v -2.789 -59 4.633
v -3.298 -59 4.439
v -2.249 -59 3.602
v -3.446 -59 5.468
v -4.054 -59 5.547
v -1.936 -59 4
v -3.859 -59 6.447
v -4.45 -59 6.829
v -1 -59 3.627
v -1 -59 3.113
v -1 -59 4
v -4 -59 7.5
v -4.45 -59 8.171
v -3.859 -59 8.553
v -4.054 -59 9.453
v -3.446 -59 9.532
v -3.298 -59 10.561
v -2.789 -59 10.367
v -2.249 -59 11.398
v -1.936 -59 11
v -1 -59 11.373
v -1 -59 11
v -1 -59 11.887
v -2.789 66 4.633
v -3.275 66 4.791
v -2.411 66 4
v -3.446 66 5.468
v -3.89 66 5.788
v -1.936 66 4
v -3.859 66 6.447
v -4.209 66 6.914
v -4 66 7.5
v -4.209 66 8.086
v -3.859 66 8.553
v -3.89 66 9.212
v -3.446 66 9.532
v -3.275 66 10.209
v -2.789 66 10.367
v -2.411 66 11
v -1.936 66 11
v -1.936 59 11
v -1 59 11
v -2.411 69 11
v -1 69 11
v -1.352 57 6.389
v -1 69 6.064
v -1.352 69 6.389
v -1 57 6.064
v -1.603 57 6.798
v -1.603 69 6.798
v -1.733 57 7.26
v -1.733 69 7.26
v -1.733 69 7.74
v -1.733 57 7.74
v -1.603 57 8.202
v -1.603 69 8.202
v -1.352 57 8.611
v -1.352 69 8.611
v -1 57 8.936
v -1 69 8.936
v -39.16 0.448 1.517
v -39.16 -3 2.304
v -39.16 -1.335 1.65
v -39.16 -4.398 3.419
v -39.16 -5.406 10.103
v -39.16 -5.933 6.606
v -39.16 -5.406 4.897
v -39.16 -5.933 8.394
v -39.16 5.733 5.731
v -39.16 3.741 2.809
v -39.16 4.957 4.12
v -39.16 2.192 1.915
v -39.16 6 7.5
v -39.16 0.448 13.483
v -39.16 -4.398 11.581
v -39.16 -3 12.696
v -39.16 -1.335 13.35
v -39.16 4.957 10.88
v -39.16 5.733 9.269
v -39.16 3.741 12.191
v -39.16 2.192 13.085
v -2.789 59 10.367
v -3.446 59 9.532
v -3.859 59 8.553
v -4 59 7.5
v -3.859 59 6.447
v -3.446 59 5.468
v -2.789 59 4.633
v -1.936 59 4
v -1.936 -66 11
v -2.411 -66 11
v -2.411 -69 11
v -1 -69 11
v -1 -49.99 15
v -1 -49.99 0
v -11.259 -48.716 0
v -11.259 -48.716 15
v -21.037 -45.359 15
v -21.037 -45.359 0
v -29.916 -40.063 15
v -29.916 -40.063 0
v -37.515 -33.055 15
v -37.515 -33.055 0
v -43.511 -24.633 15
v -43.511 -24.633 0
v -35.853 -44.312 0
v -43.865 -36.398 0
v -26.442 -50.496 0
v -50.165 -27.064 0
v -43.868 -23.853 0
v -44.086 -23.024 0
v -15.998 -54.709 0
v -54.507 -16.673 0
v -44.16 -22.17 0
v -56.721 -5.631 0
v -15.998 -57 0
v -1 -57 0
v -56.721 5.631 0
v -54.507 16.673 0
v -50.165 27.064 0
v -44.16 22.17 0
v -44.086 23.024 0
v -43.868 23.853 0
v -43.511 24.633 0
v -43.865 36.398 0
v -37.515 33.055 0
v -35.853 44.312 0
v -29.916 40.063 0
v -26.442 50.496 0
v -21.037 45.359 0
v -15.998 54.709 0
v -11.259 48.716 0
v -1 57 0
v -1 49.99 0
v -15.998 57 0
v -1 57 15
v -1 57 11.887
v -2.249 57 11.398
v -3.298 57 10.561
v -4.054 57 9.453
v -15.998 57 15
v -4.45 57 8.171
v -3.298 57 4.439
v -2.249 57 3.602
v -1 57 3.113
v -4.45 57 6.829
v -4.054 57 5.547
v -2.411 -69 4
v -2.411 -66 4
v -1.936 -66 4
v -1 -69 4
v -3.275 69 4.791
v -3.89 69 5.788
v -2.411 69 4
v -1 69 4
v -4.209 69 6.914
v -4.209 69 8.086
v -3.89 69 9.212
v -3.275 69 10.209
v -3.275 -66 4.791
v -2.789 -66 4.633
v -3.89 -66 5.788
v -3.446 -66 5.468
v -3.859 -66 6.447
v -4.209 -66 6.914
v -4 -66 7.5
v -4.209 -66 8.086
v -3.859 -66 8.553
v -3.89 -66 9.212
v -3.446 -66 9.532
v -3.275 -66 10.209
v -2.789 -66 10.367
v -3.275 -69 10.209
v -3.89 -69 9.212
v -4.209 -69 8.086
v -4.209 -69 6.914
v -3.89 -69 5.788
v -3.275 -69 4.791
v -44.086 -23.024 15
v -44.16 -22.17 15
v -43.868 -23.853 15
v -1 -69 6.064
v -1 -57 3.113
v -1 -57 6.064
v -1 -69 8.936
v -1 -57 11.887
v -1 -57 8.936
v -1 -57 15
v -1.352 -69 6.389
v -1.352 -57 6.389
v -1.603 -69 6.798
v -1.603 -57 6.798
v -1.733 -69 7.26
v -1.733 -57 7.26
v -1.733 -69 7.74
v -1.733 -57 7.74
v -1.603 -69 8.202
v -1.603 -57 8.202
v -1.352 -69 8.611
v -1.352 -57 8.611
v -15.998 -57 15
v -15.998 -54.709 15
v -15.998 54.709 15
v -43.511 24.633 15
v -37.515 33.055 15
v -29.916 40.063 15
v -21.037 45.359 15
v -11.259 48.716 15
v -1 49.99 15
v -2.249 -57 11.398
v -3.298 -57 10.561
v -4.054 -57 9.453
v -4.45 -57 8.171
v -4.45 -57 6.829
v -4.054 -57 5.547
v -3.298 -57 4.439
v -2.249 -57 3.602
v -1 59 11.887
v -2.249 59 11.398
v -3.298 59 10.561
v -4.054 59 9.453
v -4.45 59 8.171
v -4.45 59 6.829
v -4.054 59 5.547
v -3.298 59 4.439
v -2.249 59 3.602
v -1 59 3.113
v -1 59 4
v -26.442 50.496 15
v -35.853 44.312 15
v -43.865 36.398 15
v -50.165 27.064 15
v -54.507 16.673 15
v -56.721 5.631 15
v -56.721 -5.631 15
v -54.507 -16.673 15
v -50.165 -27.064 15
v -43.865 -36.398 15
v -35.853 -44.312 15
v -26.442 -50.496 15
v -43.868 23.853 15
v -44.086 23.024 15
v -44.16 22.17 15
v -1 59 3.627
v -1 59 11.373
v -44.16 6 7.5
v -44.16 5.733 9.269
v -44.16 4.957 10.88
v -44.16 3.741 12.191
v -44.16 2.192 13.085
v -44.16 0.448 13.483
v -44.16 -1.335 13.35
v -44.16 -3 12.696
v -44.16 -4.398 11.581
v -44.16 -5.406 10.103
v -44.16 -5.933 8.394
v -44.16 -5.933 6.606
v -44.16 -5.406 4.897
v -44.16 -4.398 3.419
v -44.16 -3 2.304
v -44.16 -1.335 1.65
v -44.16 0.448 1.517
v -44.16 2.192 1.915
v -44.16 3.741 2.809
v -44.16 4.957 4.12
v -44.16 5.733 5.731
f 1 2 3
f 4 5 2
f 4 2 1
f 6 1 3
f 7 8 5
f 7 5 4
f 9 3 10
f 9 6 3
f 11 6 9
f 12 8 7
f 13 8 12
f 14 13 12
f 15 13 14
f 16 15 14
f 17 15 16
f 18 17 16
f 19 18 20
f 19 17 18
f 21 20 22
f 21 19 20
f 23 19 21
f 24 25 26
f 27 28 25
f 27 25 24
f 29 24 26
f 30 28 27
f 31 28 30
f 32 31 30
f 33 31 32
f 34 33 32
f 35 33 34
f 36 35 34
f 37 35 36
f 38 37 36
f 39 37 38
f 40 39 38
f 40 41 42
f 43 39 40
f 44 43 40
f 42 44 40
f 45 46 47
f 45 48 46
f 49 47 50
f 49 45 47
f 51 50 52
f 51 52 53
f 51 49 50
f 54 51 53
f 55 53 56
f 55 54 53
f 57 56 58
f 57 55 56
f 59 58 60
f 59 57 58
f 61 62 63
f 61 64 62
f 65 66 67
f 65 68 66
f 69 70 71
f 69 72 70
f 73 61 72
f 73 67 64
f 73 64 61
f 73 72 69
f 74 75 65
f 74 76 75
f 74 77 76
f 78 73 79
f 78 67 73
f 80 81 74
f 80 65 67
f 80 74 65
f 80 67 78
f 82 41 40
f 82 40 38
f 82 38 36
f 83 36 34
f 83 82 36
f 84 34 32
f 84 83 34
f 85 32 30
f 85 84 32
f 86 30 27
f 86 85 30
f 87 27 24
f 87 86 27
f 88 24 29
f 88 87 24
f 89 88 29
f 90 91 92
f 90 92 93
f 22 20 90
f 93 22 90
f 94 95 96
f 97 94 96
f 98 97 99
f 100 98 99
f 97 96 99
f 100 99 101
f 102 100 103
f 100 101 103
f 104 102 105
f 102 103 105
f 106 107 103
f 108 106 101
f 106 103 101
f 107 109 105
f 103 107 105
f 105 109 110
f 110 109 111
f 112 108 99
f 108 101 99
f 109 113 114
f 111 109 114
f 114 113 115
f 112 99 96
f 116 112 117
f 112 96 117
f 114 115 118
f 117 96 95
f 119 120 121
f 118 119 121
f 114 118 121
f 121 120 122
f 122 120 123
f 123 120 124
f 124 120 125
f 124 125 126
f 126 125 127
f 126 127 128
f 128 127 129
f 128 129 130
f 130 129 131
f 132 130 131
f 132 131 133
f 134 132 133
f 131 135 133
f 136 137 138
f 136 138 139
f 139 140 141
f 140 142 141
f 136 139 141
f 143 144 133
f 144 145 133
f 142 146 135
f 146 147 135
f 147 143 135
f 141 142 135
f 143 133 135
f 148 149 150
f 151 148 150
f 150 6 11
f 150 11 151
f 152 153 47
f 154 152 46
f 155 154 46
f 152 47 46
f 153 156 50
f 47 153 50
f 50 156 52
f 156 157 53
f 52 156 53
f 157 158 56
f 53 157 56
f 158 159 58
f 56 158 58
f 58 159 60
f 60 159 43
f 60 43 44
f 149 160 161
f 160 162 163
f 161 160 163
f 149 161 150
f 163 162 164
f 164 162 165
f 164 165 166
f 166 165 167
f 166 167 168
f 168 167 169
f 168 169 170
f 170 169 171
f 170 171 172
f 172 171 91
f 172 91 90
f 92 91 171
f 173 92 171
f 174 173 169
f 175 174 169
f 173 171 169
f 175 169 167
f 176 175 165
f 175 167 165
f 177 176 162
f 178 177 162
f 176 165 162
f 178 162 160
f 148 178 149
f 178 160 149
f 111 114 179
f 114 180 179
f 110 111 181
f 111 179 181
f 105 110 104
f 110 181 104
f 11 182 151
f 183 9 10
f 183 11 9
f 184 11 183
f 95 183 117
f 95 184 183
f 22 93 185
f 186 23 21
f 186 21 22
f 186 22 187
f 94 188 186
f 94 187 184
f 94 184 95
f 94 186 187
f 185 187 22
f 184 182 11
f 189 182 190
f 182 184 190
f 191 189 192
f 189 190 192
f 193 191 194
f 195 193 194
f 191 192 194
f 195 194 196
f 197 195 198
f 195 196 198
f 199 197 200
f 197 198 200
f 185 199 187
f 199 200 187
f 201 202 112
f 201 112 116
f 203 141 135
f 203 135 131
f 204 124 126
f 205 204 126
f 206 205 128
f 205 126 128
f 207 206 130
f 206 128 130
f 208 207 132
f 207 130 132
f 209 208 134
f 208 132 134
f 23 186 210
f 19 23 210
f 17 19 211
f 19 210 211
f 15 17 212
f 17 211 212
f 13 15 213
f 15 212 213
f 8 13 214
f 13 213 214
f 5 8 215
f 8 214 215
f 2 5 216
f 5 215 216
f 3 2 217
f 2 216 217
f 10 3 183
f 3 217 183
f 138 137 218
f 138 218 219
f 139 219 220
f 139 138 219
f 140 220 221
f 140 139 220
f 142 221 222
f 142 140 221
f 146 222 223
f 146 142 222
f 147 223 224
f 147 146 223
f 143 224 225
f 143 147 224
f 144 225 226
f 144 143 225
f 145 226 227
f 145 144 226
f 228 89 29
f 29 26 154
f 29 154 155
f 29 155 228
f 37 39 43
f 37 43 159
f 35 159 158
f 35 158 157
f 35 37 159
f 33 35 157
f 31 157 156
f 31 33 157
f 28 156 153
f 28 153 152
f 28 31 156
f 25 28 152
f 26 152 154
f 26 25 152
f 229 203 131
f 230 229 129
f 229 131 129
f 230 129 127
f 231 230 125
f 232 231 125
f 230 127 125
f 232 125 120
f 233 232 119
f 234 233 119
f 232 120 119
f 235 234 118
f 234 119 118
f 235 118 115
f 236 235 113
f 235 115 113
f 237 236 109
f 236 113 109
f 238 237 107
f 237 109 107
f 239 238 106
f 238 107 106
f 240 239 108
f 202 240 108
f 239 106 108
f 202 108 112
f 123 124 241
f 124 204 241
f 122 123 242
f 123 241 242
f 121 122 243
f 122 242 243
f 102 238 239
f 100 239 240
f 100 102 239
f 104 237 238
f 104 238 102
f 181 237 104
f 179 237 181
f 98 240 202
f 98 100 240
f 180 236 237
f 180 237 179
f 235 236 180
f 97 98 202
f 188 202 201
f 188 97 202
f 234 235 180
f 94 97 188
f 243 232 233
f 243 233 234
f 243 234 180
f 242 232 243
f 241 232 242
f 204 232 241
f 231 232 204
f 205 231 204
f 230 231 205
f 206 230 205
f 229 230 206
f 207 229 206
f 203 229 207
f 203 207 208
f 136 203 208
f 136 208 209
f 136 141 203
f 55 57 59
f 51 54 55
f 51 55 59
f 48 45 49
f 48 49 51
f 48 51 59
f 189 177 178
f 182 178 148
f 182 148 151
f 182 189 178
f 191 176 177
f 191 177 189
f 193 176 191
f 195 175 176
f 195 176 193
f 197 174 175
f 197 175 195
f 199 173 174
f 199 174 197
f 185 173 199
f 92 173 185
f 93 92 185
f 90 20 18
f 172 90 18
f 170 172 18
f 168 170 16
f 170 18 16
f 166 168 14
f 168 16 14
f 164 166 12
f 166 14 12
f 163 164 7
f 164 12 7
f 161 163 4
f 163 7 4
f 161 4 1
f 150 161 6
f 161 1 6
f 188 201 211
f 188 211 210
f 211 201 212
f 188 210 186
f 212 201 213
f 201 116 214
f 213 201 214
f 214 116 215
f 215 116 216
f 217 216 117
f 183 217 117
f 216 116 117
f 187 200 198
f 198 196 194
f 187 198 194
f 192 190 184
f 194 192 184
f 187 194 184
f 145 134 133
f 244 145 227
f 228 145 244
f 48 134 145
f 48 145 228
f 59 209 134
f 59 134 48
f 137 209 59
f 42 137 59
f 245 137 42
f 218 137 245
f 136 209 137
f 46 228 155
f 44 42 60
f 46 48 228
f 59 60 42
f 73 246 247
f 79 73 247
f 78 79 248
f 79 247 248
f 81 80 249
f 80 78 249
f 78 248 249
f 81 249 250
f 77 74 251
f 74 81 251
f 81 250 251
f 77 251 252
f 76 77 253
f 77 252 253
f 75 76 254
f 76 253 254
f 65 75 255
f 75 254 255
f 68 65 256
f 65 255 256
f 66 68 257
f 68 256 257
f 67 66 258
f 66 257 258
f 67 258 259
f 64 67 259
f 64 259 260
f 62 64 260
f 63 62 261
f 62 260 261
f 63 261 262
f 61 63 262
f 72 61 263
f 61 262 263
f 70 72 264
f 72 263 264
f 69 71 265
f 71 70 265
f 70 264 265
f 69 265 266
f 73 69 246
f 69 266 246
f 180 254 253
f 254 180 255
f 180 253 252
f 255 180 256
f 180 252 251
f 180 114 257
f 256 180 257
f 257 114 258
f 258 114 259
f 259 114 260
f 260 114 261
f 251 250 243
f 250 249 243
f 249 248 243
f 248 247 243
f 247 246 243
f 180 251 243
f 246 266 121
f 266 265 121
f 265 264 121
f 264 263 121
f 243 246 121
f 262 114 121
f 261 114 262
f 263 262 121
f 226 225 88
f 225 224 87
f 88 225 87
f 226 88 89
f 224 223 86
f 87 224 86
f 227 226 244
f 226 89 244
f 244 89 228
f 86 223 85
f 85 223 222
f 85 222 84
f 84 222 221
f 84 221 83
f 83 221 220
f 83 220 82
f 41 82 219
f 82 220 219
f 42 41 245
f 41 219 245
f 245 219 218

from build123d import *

# Parameters (mm, degrees)
F1_DEPTH  = 15
F2_R      = 6
F3_DEPTH  = 5
F4_R      = 5
F6_DEPTH  = 2
F8_DEPTH  = 7
F10_DEPTH = 3
F11_DEPTH = 25
F13_W     = 146.8421146274
F13_H     = 28.1250011176
F14_DEPTH = 1
F15_W     = 11.3657170441
F15_H     = 11.5304403007
F15_W_2   = 13.3423628286
F15_H_2   = 13.0129233003
F16_DEPTH = 4
F17_W     = 19.5150814822
F17_H     = 12.7272193491
F17_W_2   = 18.9494257321
F17_H_2   = 10.7474377315
F18_DEPTH = 4


with BuildPart() as f1:
    # F0 (on Top) → F1 (new body)
    with BuildSketch(Plane.XY):
        with BuildLine():
            ThreePointArc((-44.16, 23.4498272915), (-25.7634298515, 42.8514373421), (0, 50))
            Line((0, 50), (0, 57))
            Line((0, 57), (-15.9976914198, 57))
            Line((-15.9976914198, 57), (-15.9976914198, 54.7089925811))
            ThreePointArc((-15.9976914198, 54.7089925811), (-57, 0), (-15.9976914198, -54.7089925811))
            Line((-15.9976914198, -54.7089925811), (-15.9976914198, -57))
            Line((-15.9976914198, -57), (0, -57))
            Line((0, -57), (0, -50))
            ThreePointArc((0, -50), (-25.7634298515, -42.8514373421), (-44.16, -23.4498272915))
            Line((-44.16, -23.4498272915), (-44.16, 23.4498272915))
        make_face()
    extrude(amount=F1_DEPTH)

    # F2 (on face) → F3 (join)
    with BuildSketch(Plane.YZ.offset(-44.16)):
        with Locations((0, 7.5)):
            Circle(F2_R)
    extrude(amount=F3_DEPTH)

    # F4
    f4_edges = [f1.edges().sort_by_distance(p)[0] for p in [
        (-44.16, 23.449827, 7.5),
        (-44.16, -23.449827, 7.5),
    ]]
    fillet(f4_edges, radius=F4_R)

    # F5 (on face) → F6 (join)
    with BuildSketch(Plane.XZ.offset(57)):
        with BuildLine():
            Line((0, 9.25), (0, 12))
            ThreePointArc((0, 12), (-4.5, 7.5), (0, 3))
            Line((0, 3), (0, 5.75))
            ThreePointArc((0, 5.75), (-1.75, 7.5), (0, 9.25))
        make_face()
    extrude(amount=F6_DEPTH)

    # F7 (on face) → F8 (join)
    with BuildSketch(Plane.XZ.offset(59)):
        with BuildLine():
            Line((0, 9.25), (0, 11.5))
            ThreePointArc((0, 11.5), (-4, 7.5), (0, 3.5))
            Line((0, 3.5), (0, 5.75))
            ThreePointArc((0, 5.75), (-1.75, 7.5), (0, 9.25))
        make_face()
    extrude(amount=F8_DEPTH)

    # F9 (on face) → F10 (join)
    with BuildSketch(Plane.XZ.offset(66)):
        with BuildLine():
            Line((0, 3.25), (0, 11.75))
            ThreePointArc((0, 11.75), (-4.25, 7.5), (0, 3.25))
        make_face()
    extrude(amount=F10_DEPTH)

    # F11 (cut): a face of the model
    f11_faces = [f1.faces().sort_by_distance(p)[0] for p in [
        (-0.7427230678, -66, 7.5),
    ]]
    extrude(f11_faces, amount=-F11_DEPTH, mode=Mode.SUBTRACT)

    # F12: F1 across plane


with BuildPart() as f1_1:
    add(f1.part)
    add(f1.part.mirror(Plane.XZ))

    # F13 (on Right) → F14 (cut)
    with BuildSketch(Plane.YZ):
        with Locations((0.2960525453, 7.5493426993)):
            Rectangle(F13_W, F13_H)
    extrude(amount=-F14_DEPTH, mode=Mode.SUBTRACT)

    # F15 (on Top) → F16 (cut)
    with BuildSketch(Plane.XY):
        with Locations((-1.9552764716, -64.7652201504)):
            Rectangle(F15_W, F15_H)
        with Locations((-2.1199961193, 65.5064616501)):
            Rectangle(F15_W_2, F15_H_2)
    extrude(amount=F16_DEPTH, mode=Mode.SUBTRACT)

    # F17 (on face) → F18 (cut)
    with BuildSketch(Plane.XY.offset(15)):
        with Locations((-4.4578294758, 65.3636096745)):
            Rectangle(F17_W, F17_H)
        with Locations((-2.7608656596, -64.3737188657)):
            Rectangle(F17_W_2, F17_H_2)
    extrude(amount=-F18_DEPTH, mode=Mode.SUBTRACT)


solid = f1_1.part
